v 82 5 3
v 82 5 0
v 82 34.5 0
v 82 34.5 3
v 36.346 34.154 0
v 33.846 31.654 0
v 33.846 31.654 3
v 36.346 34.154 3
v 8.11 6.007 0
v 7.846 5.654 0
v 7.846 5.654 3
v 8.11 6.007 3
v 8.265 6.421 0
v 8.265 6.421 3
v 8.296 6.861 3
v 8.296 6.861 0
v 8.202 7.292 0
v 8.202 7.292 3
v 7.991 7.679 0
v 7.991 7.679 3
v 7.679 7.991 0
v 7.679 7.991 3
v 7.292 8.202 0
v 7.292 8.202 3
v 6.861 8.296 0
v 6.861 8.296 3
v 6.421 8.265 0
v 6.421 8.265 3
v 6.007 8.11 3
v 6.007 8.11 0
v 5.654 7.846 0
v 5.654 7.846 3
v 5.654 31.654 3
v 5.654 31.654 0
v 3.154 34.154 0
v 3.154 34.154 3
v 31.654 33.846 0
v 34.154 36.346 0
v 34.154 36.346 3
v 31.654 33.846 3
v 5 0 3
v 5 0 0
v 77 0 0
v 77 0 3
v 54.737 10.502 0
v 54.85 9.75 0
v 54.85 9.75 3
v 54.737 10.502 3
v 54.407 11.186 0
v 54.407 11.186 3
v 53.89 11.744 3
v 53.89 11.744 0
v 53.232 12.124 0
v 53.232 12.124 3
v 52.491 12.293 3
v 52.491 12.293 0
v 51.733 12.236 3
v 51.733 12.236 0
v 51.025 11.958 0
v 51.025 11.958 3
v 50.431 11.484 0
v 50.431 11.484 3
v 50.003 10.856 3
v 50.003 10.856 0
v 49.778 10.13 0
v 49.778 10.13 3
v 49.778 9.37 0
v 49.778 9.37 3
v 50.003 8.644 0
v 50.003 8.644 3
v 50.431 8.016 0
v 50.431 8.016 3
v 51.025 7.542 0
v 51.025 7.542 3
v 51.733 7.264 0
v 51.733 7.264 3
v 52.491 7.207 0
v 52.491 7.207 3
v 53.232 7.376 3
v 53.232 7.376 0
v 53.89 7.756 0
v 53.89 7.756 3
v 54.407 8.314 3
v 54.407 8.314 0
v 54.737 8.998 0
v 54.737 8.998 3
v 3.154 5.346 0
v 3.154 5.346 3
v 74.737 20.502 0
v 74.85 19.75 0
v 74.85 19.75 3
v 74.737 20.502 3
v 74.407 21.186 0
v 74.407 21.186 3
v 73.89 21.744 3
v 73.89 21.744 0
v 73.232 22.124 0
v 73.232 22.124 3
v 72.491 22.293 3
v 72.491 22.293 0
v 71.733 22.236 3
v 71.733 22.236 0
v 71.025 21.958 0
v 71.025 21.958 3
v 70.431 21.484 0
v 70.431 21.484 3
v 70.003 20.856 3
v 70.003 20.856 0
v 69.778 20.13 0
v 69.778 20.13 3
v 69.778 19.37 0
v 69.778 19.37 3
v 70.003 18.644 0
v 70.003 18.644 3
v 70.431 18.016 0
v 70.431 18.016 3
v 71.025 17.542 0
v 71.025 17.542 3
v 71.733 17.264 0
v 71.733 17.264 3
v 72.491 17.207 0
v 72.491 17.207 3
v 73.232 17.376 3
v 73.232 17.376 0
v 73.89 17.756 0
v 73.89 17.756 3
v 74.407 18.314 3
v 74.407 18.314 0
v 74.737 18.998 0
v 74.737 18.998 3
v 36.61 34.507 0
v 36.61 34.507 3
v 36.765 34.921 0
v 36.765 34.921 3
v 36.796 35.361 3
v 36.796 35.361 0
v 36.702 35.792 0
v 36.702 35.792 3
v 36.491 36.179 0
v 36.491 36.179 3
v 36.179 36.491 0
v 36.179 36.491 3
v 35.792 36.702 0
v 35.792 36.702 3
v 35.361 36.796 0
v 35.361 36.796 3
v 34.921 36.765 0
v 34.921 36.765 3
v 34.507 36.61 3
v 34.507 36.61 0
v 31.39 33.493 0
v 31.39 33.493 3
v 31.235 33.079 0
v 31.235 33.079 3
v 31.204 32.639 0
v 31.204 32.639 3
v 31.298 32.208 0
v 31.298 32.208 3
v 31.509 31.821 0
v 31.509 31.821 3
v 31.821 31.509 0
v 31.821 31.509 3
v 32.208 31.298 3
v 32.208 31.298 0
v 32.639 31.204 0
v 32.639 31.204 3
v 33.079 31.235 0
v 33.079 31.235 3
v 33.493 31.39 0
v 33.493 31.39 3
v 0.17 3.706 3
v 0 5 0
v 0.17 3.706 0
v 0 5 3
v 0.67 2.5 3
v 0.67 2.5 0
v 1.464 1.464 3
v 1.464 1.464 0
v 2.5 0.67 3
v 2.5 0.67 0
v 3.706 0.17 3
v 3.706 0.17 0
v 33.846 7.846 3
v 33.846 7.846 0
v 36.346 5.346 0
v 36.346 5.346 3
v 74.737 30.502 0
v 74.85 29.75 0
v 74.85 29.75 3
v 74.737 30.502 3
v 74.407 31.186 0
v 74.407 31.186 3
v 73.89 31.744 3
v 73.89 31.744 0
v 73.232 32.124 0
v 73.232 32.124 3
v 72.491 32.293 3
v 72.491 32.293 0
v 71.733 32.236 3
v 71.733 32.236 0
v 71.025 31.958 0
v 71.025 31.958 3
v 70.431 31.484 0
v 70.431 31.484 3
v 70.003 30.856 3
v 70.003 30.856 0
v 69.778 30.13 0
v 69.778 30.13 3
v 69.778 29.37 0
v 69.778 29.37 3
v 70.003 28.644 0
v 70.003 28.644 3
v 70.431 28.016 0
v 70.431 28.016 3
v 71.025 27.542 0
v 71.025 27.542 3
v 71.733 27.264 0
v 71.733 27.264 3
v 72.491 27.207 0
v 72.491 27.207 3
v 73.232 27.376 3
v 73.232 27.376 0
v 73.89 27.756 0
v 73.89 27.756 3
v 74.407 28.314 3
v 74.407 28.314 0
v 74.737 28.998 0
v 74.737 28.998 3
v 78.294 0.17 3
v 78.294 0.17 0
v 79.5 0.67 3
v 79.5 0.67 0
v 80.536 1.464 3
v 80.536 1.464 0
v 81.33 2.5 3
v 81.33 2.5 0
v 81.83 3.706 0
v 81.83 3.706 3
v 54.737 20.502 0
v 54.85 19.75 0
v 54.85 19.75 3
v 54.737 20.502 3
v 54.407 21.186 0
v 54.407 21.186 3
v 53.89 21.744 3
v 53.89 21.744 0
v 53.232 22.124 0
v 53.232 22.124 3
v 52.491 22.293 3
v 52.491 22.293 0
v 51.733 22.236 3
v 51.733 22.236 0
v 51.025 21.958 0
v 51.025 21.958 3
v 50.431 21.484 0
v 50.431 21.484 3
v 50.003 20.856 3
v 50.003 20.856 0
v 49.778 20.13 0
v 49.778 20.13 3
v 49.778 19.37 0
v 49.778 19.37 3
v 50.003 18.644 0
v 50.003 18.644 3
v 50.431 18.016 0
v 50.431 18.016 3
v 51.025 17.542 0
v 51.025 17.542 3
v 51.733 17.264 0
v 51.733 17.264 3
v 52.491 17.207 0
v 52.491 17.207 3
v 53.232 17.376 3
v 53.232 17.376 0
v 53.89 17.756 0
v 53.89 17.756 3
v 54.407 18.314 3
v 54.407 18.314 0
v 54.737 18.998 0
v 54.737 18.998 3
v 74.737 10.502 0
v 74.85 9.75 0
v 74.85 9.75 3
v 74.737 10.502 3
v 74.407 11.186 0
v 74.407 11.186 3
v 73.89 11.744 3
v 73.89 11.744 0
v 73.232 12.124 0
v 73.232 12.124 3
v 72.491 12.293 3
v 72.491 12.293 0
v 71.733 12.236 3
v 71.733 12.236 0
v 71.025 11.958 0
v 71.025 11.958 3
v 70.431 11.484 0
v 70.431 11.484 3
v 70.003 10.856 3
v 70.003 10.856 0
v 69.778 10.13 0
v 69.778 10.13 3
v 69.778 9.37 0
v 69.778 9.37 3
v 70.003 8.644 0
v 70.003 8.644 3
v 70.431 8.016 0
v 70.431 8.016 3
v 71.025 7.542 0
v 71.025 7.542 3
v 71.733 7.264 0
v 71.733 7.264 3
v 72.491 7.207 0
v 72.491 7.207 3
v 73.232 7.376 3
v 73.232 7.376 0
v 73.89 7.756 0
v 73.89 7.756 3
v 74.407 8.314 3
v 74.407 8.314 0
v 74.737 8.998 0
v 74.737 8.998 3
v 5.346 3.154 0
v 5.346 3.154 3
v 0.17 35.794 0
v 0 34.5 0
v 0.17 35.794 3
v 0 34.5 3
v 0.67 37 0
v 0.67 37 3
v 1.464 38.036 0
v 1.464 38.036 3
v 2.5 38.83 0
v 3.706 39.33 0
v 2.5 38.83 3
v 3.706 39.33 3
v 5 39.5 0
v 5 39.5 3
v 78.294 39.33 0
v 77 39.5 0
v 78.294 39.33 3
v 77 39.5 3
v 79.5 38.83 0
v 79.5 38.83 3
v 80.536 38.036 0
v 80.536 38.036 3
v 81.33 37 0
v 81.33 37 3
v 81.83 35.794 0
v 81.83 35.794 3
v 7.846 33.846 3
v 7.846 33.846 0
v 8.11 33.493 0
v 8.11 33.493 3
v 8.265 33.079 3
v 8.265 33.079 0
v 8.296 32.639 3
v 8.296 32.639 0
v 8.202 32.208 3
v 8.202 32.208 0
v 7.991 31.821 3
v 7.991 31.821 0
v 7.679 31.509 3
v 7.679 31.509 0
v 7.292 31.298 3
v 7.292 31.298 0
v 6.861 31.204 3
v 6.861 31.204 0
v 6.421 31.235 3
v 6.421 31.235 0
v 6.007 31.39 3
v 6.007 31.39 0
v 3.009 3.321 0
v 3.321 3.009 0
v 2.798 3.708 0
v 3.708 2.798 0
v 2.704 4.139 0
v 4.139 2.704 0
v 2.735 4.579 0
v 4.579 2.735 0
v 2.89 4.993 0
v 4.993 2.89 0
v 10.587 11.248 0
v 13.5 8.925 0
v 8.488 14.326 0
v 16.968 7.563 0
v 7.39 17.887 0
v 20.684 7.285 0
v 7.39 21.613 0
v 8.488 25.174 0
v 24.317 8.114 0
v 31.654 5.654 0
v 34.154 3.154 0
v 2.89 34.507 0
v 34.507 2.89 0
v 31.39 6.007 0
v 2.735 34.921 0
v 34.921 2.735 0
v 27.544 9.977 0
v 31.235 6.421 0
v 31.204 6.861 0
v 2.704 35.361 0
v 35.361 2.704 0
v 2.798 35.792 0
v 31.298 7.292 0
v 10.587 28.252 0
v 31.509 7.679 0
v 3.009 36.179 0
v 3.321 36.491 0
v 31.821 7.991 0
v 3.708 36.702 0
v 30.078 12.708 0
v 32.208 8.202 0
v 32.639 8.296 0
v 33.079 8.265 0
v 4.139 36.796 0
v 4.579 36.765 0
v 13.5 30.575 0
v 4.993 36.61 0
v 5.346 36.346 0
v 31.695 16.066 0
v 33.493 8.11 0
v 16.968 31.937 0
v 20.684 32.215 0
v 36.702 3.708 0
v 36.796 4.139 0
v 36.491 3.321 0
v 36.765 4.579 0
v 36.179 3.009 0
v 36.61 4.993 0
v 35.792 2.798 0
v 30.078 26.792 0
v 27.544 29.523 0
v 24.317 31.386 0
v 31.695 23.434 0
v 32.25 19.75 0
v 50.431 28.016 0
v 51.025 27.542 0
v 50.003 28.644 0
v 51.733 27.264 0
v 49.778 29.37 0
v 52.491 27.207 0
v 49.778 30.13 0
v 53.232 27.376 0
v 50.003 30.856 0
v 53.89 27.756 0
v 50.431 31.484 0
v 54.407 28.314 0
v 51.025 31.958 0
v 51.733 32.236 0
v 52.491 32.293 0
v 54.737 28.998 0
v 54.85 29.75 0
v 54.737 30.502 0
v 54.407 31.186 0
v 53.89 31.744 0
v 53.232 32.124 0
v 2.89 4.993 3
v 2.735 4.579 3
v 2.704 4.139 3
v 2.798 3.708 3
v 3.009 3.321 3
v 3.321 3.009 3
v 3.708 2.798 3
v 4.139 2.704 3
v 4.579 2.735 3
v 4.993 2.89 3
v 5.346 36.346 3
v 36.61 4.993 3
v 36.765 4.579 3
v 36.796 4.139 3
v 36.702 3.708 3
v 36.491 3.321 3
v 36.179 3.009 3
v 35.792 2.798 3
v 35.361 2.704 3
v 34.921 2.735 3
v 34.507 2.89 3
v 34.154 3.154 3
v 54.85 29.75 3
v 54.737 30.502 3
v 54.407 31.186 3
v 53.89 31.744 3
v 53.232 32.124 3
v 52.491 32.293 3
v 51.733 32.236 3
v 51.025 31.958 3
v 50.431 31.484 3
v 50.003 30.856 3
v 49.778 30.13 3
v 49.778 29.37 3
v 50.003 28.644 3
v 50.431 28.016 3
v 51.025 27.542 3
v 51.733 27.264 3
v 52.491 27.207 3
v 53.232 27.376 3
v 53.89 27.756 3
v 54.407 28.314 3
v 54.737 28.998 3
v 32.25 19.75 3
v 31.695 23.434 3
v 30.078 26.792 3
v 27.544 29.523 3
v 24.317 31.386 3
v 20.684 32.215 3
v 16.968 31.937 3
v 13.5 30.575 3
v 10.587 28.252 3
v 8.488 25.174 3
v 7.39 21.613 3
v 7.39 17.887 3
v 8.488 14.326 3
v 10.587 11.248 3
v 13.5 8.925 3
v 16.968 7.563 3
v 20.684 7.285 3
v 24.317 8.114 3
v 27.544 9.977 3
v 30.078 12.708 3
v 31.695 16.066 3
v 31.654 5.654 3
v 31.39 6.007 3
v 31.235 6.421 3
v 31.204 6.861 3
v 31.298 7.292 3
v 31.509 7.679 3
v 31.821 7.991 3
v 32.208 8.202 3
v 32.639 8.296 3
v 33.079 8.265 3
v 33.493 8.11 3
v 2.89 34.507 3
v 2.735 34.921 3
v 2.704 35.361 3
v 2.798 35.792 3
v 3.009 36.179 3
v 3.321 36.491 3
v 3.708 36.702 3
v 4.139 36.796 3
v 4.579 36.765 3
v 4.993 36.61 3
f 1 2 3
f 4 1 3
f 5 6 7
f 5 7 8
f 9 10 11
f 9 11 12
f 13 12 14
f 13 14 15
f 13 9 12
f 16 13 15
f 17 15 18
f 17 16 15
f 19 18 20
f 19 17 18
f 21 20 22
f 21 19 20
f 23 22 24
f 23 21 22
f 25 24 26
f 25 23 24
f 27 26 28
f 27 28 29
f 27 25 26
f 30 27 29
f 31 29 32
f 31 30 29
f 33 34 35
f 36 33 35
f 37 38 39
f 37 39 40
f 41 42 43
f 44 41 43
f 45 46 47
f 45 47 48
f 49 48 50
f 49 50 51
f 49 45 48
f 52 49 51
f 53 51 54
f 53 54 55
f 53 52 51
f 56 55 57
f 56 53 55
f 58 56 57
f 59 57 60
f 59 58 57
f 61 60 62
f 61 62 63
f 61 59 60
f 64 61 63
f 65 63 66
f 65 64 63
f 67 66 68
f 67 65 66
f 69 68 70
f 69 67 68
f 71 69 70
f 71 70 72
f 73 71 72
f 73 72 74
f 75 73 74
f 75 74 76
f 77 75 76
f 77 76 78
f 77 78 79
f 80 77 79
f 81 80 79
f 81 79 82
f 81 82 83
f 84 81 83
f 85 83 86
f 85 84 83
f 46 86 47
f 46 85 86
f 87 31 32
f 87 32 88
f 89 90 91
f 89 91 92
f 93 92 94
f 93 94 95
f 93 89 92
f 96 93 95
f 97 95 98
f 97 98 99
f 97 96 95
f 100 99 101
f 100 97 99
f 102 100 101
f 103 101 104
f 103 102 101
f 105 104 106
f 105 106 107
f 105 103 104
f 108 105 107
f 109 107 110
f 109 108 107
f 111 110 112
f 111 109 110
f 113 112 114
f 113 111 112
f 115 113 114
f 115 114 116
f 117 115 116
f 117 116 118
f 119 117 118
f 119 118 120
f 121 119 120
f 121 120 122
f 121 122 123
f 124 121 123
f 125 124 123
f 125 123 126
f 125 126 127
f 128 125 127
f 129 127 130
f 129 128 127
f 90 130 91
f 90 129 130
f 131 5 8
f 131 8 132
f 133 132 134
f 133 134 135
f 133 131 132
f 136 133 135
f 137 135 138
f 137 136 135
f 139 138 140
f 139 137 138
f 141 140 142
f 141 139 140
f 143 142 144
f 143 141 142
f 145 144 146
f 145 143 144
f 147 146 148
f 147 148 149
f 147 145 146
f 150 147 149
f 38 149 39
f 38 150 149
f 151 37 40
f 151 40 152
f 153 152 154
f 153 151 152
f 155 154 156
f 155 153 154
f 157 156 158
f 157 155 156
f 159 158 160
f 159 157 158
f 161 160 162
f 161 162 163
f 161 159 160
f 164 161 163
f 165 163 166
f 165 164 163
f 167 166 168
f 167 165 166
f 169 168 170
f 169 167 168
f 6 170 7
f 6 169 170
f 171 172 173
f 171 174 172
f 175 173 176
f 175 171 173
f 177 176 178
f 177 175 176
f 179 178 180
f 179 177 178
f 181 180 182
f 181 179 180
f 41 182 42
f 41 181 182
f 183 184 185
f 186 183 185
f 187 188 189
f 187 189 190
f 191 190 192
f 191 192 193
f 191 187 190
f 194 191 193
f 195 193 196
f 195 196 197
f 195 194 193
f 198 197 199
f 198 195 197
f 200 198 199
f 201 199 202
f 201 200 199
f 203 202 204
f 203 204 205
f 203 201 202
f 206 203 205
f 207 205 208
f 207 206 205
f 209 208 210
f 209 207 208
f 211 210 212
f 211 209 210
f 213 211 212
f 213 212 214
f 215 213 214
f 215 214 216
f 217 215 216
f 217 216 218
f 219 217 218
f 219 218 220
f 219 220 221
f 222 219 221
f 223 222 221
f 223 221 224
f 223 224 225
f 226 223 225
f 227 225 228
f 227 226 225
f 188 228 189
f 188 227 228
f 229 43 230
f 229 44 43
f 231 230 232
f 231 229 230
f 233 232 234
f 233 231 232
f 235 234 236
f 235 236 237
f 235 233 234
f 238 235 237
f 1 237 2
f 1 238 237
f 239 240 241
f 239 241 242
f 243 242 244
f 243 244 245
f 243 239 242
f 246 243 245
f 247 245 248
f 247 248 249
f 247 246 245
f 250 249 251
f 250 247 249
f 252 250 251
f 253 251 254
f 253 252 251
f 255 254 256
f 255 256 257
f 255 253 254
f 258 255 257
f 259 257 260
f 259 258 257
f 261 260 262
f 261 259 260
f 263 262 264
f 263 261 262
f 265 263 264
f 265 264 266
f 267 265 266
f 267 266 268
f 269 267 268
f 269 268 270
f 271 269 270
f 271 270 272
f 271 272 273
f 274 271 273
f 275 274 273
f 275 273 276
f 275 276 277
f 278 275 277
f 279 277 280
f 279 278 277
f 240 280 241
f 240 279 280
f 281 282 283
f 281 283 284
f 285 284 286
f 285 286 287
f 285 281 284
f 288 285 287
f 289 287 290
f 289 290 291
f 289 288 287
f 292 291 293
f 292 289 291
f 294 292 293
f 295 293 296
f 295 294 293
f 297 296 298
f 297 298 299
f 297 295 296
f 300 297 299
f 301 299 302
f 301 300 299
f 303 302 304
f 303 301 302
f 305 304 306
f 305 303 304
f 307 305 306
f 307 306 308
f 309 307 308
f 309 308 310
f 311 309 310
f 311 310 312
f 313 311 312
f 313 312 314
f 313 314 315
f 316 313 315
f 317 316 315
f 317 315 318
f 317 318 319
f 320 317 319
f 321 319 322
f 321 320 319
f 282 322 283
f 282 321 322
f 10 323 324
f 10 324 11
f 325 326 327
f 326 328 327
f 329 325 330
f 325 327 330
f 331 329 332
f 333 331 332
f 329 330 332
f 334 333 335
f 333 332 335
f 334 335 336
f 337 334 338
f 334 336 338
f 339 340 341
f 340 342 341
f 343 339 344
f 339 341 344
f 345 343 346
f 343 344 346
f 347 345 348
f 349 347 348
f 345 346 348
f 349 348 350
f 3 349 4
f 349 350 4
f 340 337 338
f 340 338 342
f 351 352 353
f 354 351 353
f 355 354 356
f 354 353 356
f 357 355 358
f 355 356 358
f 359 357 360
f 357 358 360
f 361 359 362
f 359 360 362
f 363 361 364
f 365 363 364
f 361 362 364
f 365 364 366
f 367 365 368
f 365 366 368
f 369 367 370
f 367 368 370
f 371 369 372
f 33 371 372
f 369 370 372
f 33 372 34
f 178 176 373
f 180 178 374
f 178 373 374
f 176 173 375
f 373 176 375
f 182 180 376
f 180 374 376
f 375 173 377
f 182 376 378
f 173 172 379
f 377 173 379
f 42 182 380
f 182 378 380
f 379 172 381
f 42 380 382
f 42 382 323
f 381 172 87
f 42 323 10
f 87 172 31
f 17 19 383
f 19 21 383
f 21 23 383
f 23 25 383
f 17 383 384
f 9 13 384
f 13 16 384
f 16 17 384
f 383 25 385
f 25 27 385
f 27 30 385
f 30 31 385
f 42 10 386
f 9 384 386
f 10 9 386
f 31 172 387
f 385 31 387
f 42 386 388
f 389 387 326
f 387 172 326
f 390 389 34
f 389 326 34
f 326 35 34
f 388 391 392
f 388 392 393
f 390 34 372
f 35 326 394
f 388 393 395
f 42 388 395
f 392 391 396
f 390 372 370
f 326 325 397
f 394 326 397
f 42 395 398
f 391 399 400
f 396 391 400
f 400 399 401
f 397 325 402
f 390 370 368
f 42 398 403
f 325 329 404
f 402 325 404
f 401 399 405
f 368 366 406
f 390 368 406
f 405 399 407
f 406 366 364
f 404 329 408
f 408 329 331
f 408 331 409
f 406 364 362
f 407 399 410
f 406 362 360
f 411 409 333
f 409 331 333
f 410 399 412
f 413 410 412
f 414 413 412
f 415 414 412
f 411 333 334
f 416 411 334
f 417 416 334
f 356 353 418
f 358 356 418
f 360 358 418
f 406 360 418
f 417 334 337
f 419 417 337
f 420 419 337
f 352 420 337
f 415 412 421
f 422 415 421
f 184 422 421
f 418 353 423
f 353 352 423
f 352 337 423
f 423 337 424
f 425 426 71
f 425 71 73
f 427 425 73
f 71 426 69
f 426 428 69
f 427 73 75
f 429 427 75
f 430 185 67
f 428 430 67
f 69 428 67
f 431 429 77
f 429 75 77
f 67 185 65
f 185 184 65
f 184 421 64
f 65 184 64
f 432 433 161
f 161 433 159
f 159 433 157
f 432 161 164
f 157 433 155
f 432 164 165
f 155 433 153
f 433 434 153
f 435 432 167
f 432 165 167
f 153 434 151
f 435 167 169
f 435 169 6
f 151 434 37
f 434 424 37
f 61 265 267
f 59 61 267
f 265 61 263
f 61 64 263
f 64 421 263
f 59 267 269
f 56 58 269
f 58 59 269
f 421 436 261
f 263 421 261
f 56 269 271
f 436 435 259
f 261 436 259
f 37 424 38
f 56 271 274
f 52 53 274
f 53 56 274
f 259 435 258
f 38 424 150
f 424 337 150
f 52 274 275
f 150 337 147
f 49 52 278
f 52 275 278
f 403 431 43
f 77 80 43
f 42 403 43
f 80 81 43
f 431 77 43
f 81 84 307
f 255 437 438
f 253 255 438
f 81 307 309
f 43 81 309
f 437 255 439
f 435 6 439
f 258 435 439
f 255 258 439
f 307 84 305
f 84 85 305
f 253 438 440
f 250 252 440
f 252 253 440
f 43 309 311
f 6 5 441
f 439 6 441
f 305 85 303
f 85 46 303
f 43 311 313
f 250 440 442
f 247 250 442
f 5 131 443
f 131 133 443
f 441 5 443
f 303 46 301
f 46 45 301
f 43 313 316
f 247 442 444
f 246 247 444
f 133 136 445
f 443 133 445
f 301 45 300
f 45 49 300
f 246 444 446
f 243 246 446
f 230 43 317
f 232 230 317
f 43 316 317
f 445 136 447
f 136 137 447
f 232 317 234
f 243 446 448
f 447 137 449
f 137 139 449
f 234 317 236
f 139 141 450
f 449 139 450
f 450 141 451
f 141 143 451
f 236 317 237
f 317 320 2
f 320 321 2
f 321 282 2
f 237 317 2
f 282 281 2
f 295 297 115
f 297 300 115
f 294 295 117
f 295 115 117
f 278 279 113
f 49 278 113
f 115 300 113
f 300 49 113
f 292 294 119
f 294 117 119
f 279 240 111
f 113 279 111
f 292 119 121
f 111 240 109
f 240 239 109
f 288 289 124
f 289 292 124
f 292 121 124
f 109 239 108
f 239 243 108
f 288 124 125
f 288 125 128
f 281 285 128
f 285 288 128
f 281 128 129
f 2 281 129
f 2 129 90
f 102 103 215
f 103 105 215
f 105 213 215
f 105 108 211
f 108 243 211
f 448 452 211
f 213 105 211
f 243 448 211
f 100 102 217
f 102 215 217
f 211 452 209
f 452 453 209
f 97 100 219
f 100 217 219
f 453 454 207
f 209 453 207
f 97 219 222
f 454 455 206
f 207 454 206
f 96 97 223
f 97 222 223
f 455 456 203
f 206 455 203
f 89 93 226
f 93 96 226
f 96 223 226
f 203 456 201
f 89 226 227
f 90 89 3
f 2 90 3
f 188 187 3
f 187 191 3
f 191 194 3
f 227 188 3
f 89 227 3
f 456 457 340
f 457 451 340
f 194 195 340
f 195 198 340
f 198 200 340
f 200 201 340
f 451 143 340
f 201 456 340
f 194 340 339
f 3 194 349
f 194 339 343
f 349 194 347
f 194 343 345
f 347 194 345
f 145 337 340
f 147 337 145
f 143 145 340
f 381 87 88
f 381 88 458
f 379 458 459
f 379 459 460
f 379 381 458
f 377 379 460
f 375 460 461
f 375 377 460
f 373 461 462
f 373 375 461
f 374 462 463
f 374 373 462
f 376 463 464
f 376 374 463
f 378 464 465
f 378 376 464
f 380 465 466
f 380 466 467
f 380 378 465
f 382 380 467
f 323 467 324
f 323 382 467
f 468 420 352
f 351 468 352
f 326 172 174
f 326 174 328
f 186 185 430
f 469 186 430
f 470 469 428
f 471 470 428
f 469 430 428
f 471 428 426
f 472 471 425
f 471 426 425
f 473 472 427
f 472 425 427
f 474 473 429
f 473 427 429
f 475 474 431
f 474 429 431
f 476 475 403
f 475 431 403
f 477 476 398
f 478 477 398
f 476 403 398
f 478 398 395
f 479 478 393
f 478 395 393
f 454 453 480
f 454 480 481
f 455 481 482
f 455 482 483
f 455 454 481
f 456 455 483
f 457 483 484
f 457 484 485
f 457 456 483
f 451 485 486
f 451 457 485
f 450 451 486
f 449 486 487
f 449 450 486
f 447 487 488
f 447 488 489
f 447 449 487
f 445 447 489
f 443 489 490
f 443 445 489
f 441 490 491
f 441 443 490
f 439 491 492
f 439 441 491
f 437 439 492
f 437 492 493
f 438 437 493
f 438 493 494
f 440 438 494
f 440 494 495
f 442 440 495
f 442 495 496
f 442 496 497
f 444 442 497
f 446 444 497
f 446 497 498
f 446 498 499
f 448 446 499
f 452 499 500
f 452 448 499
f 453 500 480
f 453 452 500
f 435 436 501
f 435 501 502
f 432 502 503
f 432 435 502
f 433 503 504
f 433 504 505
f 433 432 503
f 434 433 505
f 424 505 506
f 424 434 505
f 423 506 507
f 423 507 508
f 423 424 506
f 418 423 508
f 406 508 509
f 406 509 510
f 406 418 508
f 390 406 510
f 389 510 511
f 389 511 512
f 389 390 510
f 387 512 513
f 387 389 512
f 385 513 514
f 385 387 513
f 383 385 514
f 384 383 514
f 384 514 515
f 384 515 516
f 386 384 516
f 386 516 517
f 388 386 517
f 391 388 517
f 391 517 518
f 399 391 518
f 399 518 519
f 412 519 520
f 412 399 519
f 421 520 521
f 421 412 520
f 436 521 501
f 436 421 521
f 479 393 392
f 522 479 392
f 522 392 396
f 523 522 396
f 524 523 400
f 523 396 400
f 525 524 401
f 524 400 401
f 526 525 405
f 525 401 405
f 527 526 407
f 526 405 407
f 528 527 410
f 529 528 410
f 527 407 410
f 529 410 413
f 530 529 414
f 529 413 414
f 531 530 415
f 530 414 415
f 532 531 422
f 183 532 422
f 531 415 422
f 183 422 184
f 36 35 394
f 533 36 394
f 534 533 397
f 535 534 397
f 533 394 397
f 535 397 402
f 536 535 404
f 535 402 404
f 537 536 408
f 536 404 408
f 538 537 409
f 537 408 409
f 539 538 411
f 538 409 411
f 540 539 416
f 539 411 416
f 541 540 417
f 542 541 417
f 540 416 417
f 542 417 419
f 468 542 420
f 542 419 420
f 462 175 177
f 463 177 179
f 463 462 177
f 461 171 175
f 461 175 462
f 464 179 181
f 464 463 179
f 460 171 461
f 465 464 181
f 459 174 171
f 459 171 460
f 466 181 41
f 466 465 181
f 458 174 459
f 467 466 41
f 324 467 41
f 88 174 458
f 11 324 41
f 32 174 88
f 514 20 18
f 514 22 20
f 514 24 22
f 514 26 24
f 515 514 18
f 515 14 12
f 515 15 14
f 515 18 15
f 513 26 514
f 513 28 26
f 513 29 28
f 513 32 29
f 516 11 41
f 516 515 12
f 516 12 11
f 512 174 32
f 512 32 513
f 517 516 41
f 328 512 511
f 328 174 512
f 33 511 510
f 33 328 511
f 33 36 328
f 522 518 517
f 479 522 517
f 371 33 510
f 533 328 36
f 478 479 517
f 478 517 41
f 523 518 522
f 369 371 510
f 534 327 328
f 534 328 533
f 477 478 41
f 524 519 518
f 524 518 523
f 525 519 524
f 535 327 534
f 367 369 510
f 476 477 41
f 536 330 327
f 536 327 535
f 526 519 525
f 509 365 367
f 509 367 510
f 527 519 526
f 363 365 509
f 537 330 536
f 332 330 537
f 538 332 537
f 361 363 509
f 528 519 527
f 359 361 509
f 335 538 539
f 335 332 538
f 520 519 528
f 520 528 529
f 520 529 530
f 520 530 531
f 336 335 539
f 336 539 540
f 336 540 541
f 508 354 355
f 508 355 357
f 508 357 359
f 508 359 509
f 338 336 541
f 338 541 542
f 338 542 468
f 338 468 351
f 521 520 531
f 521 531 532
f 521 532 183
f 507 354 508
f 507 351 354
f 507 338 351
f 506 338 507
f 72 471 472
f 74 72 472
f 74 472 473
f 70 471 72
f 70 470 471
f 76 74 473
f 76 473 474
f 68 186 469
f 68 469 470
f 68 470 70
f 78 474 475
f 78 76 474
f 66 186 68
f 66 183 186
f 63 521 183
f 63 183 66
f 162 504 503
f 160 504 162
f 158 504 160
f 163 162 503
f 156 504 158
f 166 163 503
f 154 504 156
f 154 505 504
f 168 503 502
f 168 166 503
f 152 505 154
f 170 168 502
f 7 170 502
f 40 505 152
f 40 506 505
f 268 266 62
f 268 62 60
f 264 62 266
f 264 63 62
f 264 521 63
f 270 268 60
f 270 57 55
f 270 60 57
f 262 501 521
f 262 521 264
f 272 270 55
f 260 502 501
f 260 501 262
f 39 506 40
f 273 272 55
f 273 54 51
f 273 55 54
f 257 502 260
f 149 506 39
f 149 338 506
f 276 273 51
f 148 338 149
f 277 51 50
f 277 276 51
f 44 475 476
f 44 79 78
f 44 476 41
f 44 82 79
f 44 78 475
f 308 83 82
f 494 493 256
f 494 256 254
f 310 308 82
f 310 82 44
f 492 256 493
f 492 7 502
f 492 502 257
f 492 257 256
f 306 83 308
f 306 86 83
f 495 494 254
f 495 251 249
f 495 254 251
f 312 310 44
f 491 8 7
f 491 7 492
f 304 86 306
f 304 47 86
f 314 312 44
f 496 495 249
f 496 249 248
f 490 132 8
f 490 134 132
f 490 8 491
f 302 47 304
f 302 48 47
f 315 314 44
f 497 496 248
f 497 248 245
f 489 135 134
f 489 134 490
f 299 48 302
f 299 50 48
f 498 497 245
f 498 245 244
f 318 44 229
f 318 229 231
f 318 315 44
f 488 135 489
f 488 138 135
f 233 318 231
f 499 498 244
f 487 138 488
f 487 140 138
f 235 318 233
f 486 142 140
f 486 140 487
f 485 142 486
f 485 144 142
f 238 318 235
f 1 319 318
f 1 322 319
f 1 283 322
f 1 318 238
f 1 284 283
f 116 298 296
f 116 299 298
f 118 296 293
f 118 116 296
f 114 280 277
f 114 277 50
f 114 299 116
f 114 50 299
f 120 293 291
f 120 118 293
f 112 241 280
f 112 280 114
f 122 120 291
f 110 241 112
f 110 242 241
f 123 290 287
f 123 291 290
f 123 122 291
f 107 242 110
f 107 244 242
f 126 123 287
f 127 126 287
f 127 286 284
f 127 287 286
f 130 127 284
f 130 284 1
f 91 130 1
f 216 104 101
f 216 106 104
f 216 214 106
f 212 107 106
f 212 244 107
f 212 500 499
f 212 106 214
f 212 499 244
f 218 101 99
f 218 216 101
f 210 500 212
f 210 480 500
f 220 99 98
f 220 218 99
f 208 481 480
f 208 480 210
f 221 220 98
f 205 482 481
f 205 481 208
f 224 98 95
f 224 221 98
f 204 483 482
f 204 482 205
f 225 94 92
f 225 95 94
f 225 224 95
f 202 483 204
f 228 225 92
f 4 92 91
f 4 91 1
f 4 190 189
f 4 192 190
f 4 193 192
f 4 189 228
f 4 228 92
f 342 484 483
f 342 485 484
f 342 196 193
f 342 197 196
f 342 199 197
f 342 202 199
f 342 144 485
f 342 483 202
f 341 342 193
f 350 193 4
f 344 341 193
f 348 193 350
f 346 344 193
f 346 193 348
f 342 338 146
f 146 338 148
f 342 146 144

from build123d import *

# Parameters (mm, degrees)
SKETCH1_W           = 82
SKETCH1_H           = 39.5
SKETCH1_R           = 12.5
SKETCH1_R_2         = 2.55
BOSS_EXTRUDE1_DEPTH = 3
FILLET1_R           = 5


with BuildPart() as part:
    # Sketch1 → Boss-Extrude1 (new body)
    with BuildSketch(Plane.XY):
        with Locations((41, 19.75)):
            Rectangle(SKETCH1_W, SKETCH1_H)
        with Locations((19.75, 19.75)):
            Circle(SKETCH1_R, mode=Mode.SUBTRACT)
        with Locations((52.3, 19.75)):
            Circle(SKETCH1_R_2, mode=Mode.SUBTRACT)
        with Locations((52.3, 29.75)):
            Circle(SKETCH1_R_2, mode=Mode.SUBTRACT)
        with Locations((52.3, 9.75)):
            Circle(SKETCH1_R_2, mode=Mode.SUBTRACT)
        with Locations((72.3, 9.75)):
            Circle(SKETCH1_R_2, mode=Mode.SUBTRACT)
        with Locations((72.3, 19.75)):
            Circle(SKETCH1_R_2, mode=Mode.SUBTRACT)
        with Locations((72.3, 29.75)):
            Circle(SKETCH1_R_2, mode=Mode.SUBTRACT)
        with BuildLine():
            Line((5.346015511, 36.346015511), (7.846015511, 33.846015511))
            ThreePointArc((7.846015511, 33.846015511), (7.846015511, 31.653984489), (5.653984489, 31.653984489))
            Line((5.653984489, 31.653984489), (3.153984489, 34.153984489))
            ThreePointArc((3.153984489, 34.153984489), (3.153984489, 36.346015511), (5.346015511, 36.346015511))
        make_face(mode=Mode.SUBTRACT)
        with BuildLine():
            Line((34.153984489, 36.346015511), (31.653984489, 33.846015511))
            ThreePointArc((31.653984489, 33.846015511), (31.653984489, 31.653984489), (33.846015511, 31.653984489))
            Line((33.846015511, 31.653984489), (36.346015511, 34.153984489))
            ThreePointArc((36.346015511, 34.153984489), (36.346015511, 36.346015511), (34.153984489, 36.346015511))
        make_face(mode=Mode.SUBTRACT)
        with BuildLine():
            Line((34.153984489, 3.153984489), (31.653984489, 5.653984489))
            ThreePointArc((31.653984489, 5.653984489), (31.653984489, 7.846015511), (33.846015511, 7.846015511))
            Line((33.846015511, 7.846015511), (36.346015511, 5.346015511))
            ThreePointArc((36.346015511, 5.346015511), (36.346015511, 3.153984489), (34.153984489, 3.153984489))
        make_face(mode=Mode.SUBTRACT)
        with BuildLine():
            Line((5.346015511, 3.153984489), (7.846015511, 5.653984489))
            ThreePointArc((7.846015511, 5.653984489), (7.846015511, 7.846015511), (5.653984489, 7.846015511))
            Line((5.653984489, 7.846015511), (3.153984489, 5.346015511))
            ThreePointArc((3.153984489, 5.346015511), (3.153984489, 3.153984489), (5.346015511, 3.153984489))
        make_face(mode=Mode.SUBTRACT)
    extrude(amount=BOSS_EXTRUDE1_DEPTH)

    # Fillet1
    fillet1_edges = [part.edges().sort_by_distance(p)[0] for p in [
        (0, 39.5, 1.5),
        (82, 39.5, 1.5),
        (82, 0, 1.5),
        (0, 0, 1.5),
    ]]
    fillet(fillet1_edges, radius=FILLET1_R)


solid = part.part
